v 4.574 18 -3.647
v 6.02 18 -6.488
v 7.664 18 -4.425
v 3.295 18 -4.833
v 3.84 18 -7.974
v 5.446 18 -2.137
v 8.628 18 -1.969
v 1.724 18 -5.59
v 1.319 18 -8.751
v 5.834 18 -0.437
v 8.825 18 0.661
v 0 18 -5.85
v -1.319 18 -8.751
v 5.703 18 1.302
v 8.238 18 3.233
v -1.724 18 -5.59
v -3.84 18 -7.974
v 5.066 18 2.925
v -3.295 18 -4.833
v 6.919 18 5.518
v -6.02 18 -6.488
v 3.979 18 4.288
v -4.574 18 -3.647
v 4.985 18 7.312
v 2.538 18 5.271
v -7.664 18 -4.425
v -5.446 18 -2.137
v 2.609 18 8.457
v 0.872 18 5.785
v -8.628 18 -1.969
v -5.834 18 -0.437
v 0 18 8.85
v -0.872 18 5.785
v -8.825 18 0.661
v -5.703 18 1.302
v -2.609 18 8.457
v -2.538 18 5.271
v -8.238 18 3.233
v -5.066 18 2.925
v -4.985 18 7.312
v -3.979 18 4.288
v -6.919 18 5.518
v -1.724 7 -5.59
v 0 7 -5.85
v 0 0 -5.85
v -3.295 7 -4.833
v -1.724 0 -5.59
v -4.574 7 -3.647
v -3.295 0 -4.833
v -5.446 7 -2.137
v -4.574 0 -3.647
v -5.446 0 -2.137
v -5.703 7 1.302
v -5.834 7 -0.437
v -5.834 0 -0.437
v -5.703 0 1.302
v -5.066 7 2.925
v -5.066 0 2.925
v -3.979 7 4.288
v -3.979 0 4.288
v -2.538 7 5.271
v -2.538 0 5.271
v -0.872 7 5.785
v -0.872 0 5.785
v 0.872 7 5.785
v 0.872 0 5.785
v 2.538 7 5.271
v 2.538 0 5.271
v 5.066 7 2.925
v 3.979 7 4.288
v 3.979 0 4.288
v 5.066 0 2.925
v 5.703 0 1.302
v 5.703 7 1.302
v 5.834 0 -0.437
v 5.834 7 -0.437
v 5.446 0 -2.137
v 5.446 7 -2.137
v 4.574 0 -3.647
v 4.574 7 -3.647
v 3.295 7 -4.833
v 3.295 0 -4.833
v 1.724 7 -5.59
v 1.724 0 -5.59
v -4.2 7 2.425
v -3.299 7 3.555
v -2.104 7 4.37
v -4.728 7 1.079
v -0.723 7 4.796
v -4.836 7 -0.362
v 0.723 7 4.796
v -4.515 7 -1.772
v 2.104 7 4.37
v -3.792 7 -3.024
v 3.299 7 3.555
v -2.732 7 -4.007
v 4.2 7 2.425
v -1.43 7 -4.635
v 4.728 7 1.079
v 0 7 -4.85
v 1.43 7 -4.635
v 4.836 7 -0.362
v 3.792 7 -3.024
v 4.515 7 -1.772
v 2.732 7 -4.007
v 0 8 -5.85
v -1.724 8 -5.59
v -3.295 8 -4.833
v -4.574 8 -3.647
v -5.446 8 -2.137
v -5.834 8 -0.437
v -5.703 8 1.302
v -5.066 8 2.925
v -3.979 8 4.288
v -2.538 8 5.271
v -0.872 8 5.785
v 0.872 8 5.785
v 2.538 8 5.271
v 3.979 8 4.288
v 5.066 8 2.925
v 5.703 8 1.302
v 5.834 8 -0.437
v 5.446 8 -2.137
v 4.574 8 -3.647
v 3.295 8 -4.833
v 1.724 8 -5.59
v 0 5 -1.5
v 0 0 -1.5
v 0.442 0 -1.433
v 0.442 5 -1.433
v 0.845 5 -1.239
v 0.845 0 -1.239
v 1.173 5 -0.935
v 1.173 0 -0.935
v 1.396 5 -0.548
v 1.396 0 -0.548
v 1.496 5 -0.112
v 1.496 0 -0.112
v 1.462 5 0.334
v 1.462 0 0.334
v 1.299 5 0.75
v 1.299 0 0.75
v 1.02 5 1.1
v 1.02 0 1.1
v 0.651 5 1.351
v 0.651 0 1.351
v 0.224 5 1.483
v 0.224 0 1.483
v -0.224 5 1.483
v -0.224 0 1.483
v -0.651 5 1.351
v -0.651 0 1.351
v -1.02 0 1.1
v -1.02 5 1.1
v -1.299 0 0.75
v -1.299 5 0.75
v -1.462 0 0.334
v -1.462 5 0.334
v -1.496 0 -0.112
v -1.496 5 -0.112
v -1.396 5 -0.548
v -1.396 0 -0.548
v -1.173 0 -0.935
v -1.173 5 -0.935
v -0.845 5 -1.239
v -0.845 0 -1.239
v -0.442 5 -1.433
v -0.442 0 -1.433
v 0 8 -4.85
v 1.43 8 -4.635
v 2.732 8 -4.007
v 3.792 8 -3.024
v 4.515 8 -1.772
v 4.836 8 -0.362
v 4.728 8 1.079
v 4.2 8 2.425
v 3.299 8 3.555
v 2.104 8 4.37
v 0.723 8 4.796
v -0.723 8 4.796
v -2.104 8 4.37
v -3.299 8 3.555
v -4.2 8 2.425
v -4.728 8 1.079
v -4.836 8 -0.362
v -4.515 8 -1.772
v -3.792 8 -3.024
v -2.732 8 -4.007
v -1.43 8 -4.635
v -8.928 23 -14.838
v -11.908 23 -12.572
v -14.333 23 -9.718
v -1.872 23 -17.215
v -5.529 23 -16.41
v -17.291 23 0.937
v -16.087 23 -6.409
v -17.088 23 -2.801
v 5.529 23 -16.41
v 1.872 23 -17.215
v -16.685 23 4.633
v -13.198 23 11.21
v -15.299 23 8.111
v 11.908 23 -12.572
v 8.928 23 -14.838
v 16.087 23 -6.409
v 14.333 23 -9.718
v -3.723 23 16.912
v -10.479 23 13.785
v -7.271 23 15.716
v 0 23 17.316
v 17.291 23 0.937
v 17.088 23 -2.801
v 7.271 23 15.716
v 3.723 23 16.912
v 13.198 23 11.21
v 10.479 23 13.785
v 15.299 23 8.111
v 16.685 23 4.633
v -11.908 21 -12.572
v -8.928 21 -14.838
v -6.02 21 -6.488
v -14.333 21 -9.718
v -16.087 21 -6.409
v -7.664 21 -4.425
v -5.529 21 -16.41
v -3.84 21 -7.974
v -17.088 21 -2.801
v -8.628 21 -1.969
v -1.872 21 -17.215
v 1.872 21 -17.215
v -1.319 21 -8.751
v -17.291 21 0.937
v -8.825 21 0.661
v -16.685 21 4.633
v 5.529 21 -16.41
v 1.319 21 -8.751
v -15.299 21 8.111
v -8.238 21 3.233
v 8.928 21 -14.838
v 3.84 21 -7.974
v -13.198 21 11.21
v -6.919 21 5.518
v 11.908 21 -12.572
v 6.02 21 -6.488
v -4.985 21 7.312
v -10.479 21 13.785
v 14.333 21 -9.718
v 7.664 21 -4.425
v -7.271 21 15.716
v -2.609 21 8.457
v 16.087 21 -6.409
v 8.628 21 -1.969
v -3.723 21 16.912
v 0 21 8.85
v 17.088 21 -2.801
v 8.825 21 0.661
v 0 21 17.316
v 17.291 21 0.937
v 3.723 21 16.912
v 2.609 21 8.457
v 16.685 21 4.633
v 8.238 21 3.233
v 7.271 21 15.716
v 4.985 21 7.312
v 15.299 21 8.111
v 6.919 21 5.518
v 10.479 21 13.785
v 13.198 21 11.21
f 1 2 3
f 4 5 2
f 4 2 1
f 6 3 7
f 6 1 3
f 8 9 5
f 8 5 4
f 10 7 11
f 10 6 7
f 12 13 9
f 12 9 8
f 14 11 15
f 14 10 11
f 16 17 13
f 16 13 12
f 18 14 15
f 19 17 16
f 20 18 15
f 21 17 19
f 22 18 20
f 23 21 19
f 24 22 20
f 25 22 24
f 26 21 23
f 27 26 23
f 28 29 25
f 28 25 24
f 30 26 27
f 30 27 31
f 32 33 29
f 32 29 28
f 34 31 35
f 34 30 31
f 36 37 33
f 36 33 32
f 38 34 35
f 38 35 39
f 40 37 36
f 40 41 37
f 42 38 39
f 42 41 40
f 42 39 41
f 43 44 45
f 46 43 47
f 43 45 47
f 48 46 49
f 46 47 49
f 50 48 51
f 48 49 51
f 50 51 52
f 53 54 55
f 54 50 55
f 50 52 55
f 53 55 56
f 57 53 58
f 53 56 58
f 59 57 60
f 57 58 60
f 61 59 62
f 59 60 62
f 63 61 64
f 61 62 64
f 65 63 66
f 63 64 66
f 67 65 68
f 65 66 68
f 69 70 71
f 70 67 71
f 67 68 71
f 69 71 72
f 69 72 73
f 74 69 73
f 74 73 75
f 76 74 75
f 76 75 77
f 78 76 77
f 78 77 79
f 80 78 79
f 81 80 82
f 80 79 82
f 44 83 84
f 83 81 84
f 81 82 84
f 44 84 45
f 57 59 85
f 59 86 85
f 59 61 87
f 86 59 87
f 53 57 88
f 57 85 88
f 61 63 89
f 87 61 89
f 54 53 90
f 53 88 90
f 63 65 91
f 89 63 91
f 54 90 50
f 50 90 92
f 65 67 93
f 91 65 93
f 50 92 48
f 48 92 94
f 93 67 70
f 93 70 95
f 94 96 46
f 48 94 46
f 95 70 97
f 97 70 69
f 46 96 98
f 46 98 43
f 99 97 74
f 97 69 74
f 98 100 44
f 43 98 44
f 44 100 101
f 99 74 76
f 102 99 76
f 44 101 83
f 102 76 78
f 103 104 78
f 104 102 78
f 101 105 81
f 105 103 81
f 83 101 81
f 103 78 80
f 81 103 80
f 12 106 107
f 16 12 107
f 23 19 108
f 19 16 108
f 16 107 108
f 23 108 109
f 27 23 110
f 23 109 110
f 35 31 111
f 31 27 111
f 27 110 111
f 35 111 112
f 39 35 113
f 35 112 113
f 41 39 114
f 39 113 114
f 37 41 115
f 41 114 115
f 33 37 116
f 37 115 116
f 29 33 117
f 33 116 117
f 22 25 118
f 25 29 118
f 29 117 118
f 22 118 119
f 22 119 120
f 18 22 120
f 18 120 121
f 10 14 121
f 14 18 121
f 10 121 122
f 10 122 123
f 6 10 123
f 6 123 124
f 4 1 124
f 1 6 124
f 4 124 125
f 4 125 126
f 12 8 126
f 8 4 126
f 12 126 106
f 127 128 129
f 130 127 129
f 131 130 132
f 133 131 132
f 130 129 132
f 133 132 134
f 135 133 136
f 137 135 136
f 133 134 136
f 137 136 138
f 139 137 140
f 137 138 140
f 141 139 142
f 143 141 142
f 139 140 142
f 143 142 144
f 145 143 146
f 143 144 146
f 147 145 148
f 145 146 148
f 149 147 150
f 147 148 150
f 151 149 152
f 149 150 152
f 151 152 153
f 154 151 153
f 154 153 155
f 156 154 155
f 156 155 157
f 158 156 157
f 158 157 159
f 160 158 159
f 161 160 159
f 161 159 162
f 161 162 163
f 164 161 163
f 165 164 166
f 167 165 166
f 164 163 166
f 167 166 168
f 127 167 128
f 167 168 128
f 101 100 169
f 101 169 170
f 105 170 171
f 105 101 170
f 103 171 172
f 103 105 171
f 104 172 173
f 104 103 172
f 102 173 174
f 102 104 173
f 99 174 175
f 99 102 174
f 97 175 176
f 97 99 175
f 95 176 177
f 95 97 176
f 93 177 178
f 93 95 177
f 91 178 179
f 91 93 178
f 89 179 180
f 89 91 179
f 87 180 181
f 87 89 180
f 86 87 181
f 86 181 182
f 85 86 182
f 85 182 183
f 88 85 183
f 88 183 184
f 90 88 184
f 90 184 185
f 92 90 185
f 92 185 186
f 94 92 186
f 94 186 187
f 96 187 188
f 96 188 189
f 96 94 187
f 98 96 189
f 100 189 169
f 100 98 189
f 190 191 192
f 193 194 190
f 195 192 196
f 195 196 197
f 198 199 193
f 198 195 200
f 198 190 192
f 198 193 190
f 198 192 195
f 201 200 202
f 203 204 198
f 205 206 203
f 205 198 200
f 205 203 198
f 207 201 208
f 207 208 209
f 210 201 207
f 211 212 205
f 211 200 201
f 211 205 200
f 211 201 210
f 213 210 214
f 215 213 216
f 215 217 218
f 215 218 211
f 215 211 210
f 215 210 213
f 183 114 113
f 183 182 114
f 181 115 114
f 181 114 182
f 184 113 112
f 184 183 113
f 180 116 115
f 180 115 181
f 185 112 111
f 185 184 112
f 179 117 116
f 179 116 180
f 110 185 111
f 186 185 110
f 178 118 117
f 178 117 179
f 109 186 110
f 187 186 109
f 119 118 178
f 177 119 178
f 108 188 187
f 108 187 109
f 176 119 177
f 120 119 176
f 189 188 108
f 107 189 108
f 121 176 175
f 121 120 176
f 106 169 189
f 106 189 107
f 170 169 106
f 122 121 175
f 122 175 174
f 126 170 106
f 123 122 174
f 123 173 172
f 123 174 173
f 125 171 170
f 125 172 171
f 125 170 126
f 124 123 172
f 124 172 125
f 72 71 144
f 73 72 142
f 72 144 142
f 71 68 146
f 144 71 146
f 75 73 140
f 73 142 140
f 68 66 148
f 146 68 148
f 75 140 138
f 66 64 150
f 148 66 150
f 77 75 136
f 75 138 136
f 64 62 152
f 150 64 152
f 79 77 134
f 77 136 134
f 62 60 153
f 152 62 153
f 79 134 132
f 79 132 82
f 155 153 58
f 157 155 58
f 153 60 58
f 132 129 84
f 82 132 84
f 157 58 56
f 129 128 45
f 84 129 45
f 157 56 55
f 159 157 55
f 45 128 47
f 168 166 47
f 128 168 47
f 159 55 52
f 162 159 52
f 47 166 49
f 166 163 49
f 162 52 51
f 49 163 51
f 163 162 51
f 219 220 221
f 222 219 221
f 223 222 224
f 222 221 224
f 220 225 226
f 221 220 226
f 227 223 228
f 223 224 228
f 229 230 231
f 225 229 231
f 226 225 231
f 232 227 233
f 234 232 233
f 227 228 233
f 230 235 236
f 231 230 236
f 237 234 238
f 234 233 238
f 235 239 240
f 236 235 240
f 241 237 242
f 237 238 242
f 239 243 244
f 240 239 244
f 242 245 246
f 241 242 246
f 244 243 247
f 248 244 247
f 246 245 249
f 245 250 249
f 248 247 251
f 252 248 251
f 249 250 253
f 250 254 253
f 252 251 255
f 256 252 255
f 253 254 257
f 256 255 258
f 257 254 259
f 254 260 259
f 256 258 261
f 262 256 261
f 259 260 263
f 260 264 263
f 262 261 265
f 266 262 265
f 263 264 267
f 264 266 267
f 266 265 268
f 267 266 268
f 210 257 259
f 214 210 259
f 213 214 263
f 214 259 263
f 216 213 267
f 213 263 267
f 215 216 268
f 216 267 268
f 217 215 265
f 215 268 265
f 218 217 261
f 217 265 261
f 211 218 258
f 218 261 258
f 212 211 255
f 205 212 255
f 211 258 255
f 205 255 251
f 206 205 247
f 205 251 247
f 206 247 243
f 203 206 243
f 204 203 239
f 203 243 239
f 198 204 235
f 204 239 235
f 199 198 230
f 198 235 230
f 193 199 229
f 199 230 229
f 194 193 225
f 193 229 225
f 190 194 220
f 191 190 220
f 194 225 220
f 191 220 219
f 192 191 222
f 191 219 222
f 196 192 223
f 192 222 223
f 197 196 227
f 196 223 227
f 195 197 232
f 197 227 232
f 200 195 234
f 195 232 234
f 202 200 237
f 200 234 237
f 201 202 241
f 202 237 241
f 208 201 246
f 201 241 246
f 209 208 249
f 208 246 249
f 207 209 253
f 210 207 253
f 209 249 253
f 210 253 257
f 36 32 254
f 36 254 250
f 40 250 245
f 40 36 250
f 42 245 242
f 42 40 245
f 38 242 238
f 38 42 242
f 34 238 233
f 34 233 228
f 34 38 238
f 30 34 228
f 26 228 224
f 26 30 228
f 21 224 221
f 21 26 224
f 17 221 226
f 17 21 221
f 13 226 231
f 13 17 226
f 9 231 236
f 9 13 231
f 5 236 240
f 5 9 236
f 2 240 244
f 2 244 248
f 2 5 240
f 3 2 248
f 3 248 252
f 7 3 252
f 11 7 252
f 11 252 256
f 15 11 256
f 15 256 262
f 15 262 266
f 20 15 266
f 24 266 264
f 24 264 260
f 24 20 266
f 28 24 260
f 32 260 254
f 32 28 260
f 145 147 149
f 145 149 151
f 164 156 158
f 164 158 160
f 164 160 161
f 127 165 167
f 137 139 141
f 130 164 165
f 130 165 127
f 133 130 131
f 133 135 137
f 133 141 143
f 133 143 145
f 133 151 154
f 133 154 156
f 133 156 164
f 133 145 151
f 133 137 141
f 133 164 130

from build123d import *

# Parameters (mm, degrees)
SKETCH1_R           = 5.85
BOSS_EXTRUDE1_DEPTH = 21
SKETCH2_R           = 17.316392141
BOSS_EXTRUDE2_DEPTH = 2
CUT_EXTRUDE1_START  = 1
SKETCH3_R           = 5.85
SKETCH3_R_2         = 4.85
CUT_EXTRUDE1_DEPTH  = 1
SKETCH4_R           = 1.5
CUT_EXTRUDE2_DEPTH  = 5
BOSS_EXTRUDE4_START = 3
SKETCH5_R           = 8.85
SKETCH5_R_2         = 5.85
BOSS_EXTRUDE4_DEPTH = 3


with BuildPart() as part:
    # Sketch1 → Boss-Extrude1 (new body)
    with BuildSketch(Plane(origin=(0, 0, 0), x_dir=(1, 0, 0), z_dir=(0, 1, 0))):
        with Locations(Location((0, 0, 0), (0, 0, 90))):
            Circle(SKETCH1_R)
    extrude(amount=BOSS_EXTRUDE1_DEPTH)

    # Sketch2 → Boss-Extrude2 (add)
    with BuildSketch(Plane(origin=(0, 21, 0), x_dir=(1, 0, 0), z_dir=(0, 1, 0))):
        with Locations(Location((0, 0, 0), (0, 0, 270))):
            Circle(SKETCH2_R)
    extrude(amount=BOSS_EXTRUDE2_DEPTH)

    # Sketch3 → Cut-Extrude1 (cut)
    with BuildSketch(Plane(origin=(0, 8, 0), x_dir=(-1, 0, 0), z_dir=(0, -1, 0)).offset(CUT_EXTRUDE1_START)):
        with Locations(Location((0, 0, 0), (0, 0, 90))):
            Circle(SKETCH3_R)
        with Locations(Location((0, 0, 0), (0, 0, 90))):
            Circle(SKETCH3_R_2, mode=Mode.SUBTRACT)
    extrude(amount=-CUT_EXTRUDE1_DEPTH, mode=Mode.SUBTRACT)

    # Sketch4 → Cut-Extrude2 (cut)
    with BuildSketch(Plane.XZ):
        with Locations(Location((0, 0, 0), (0, 0, 270))):
            Circle(SKETCH4_R)
    extrude(amount=-CUT_EXTRUDE2_DEPTH, mode=Mode.SUBTRACT)

    # Sketch5 → Boss-Extrude4 (add)
    with BuildSketch(Plane.XZ.offset(-21).offset(BOSS_EXTRUDE4_START)):
        with Locations(Location((0, 0, 0), (0, 0, 90))):
            Circle(SKETCH5_R)
        with Locations(Location((0, 0, 0), (0, 0, 270))):
            Circle(SKETCH5_R_2, mode=Mode.SUBTRACT)
    extrude(amount=-BOSS_EXTRUDE4_DEPTH)


solid = part.part
